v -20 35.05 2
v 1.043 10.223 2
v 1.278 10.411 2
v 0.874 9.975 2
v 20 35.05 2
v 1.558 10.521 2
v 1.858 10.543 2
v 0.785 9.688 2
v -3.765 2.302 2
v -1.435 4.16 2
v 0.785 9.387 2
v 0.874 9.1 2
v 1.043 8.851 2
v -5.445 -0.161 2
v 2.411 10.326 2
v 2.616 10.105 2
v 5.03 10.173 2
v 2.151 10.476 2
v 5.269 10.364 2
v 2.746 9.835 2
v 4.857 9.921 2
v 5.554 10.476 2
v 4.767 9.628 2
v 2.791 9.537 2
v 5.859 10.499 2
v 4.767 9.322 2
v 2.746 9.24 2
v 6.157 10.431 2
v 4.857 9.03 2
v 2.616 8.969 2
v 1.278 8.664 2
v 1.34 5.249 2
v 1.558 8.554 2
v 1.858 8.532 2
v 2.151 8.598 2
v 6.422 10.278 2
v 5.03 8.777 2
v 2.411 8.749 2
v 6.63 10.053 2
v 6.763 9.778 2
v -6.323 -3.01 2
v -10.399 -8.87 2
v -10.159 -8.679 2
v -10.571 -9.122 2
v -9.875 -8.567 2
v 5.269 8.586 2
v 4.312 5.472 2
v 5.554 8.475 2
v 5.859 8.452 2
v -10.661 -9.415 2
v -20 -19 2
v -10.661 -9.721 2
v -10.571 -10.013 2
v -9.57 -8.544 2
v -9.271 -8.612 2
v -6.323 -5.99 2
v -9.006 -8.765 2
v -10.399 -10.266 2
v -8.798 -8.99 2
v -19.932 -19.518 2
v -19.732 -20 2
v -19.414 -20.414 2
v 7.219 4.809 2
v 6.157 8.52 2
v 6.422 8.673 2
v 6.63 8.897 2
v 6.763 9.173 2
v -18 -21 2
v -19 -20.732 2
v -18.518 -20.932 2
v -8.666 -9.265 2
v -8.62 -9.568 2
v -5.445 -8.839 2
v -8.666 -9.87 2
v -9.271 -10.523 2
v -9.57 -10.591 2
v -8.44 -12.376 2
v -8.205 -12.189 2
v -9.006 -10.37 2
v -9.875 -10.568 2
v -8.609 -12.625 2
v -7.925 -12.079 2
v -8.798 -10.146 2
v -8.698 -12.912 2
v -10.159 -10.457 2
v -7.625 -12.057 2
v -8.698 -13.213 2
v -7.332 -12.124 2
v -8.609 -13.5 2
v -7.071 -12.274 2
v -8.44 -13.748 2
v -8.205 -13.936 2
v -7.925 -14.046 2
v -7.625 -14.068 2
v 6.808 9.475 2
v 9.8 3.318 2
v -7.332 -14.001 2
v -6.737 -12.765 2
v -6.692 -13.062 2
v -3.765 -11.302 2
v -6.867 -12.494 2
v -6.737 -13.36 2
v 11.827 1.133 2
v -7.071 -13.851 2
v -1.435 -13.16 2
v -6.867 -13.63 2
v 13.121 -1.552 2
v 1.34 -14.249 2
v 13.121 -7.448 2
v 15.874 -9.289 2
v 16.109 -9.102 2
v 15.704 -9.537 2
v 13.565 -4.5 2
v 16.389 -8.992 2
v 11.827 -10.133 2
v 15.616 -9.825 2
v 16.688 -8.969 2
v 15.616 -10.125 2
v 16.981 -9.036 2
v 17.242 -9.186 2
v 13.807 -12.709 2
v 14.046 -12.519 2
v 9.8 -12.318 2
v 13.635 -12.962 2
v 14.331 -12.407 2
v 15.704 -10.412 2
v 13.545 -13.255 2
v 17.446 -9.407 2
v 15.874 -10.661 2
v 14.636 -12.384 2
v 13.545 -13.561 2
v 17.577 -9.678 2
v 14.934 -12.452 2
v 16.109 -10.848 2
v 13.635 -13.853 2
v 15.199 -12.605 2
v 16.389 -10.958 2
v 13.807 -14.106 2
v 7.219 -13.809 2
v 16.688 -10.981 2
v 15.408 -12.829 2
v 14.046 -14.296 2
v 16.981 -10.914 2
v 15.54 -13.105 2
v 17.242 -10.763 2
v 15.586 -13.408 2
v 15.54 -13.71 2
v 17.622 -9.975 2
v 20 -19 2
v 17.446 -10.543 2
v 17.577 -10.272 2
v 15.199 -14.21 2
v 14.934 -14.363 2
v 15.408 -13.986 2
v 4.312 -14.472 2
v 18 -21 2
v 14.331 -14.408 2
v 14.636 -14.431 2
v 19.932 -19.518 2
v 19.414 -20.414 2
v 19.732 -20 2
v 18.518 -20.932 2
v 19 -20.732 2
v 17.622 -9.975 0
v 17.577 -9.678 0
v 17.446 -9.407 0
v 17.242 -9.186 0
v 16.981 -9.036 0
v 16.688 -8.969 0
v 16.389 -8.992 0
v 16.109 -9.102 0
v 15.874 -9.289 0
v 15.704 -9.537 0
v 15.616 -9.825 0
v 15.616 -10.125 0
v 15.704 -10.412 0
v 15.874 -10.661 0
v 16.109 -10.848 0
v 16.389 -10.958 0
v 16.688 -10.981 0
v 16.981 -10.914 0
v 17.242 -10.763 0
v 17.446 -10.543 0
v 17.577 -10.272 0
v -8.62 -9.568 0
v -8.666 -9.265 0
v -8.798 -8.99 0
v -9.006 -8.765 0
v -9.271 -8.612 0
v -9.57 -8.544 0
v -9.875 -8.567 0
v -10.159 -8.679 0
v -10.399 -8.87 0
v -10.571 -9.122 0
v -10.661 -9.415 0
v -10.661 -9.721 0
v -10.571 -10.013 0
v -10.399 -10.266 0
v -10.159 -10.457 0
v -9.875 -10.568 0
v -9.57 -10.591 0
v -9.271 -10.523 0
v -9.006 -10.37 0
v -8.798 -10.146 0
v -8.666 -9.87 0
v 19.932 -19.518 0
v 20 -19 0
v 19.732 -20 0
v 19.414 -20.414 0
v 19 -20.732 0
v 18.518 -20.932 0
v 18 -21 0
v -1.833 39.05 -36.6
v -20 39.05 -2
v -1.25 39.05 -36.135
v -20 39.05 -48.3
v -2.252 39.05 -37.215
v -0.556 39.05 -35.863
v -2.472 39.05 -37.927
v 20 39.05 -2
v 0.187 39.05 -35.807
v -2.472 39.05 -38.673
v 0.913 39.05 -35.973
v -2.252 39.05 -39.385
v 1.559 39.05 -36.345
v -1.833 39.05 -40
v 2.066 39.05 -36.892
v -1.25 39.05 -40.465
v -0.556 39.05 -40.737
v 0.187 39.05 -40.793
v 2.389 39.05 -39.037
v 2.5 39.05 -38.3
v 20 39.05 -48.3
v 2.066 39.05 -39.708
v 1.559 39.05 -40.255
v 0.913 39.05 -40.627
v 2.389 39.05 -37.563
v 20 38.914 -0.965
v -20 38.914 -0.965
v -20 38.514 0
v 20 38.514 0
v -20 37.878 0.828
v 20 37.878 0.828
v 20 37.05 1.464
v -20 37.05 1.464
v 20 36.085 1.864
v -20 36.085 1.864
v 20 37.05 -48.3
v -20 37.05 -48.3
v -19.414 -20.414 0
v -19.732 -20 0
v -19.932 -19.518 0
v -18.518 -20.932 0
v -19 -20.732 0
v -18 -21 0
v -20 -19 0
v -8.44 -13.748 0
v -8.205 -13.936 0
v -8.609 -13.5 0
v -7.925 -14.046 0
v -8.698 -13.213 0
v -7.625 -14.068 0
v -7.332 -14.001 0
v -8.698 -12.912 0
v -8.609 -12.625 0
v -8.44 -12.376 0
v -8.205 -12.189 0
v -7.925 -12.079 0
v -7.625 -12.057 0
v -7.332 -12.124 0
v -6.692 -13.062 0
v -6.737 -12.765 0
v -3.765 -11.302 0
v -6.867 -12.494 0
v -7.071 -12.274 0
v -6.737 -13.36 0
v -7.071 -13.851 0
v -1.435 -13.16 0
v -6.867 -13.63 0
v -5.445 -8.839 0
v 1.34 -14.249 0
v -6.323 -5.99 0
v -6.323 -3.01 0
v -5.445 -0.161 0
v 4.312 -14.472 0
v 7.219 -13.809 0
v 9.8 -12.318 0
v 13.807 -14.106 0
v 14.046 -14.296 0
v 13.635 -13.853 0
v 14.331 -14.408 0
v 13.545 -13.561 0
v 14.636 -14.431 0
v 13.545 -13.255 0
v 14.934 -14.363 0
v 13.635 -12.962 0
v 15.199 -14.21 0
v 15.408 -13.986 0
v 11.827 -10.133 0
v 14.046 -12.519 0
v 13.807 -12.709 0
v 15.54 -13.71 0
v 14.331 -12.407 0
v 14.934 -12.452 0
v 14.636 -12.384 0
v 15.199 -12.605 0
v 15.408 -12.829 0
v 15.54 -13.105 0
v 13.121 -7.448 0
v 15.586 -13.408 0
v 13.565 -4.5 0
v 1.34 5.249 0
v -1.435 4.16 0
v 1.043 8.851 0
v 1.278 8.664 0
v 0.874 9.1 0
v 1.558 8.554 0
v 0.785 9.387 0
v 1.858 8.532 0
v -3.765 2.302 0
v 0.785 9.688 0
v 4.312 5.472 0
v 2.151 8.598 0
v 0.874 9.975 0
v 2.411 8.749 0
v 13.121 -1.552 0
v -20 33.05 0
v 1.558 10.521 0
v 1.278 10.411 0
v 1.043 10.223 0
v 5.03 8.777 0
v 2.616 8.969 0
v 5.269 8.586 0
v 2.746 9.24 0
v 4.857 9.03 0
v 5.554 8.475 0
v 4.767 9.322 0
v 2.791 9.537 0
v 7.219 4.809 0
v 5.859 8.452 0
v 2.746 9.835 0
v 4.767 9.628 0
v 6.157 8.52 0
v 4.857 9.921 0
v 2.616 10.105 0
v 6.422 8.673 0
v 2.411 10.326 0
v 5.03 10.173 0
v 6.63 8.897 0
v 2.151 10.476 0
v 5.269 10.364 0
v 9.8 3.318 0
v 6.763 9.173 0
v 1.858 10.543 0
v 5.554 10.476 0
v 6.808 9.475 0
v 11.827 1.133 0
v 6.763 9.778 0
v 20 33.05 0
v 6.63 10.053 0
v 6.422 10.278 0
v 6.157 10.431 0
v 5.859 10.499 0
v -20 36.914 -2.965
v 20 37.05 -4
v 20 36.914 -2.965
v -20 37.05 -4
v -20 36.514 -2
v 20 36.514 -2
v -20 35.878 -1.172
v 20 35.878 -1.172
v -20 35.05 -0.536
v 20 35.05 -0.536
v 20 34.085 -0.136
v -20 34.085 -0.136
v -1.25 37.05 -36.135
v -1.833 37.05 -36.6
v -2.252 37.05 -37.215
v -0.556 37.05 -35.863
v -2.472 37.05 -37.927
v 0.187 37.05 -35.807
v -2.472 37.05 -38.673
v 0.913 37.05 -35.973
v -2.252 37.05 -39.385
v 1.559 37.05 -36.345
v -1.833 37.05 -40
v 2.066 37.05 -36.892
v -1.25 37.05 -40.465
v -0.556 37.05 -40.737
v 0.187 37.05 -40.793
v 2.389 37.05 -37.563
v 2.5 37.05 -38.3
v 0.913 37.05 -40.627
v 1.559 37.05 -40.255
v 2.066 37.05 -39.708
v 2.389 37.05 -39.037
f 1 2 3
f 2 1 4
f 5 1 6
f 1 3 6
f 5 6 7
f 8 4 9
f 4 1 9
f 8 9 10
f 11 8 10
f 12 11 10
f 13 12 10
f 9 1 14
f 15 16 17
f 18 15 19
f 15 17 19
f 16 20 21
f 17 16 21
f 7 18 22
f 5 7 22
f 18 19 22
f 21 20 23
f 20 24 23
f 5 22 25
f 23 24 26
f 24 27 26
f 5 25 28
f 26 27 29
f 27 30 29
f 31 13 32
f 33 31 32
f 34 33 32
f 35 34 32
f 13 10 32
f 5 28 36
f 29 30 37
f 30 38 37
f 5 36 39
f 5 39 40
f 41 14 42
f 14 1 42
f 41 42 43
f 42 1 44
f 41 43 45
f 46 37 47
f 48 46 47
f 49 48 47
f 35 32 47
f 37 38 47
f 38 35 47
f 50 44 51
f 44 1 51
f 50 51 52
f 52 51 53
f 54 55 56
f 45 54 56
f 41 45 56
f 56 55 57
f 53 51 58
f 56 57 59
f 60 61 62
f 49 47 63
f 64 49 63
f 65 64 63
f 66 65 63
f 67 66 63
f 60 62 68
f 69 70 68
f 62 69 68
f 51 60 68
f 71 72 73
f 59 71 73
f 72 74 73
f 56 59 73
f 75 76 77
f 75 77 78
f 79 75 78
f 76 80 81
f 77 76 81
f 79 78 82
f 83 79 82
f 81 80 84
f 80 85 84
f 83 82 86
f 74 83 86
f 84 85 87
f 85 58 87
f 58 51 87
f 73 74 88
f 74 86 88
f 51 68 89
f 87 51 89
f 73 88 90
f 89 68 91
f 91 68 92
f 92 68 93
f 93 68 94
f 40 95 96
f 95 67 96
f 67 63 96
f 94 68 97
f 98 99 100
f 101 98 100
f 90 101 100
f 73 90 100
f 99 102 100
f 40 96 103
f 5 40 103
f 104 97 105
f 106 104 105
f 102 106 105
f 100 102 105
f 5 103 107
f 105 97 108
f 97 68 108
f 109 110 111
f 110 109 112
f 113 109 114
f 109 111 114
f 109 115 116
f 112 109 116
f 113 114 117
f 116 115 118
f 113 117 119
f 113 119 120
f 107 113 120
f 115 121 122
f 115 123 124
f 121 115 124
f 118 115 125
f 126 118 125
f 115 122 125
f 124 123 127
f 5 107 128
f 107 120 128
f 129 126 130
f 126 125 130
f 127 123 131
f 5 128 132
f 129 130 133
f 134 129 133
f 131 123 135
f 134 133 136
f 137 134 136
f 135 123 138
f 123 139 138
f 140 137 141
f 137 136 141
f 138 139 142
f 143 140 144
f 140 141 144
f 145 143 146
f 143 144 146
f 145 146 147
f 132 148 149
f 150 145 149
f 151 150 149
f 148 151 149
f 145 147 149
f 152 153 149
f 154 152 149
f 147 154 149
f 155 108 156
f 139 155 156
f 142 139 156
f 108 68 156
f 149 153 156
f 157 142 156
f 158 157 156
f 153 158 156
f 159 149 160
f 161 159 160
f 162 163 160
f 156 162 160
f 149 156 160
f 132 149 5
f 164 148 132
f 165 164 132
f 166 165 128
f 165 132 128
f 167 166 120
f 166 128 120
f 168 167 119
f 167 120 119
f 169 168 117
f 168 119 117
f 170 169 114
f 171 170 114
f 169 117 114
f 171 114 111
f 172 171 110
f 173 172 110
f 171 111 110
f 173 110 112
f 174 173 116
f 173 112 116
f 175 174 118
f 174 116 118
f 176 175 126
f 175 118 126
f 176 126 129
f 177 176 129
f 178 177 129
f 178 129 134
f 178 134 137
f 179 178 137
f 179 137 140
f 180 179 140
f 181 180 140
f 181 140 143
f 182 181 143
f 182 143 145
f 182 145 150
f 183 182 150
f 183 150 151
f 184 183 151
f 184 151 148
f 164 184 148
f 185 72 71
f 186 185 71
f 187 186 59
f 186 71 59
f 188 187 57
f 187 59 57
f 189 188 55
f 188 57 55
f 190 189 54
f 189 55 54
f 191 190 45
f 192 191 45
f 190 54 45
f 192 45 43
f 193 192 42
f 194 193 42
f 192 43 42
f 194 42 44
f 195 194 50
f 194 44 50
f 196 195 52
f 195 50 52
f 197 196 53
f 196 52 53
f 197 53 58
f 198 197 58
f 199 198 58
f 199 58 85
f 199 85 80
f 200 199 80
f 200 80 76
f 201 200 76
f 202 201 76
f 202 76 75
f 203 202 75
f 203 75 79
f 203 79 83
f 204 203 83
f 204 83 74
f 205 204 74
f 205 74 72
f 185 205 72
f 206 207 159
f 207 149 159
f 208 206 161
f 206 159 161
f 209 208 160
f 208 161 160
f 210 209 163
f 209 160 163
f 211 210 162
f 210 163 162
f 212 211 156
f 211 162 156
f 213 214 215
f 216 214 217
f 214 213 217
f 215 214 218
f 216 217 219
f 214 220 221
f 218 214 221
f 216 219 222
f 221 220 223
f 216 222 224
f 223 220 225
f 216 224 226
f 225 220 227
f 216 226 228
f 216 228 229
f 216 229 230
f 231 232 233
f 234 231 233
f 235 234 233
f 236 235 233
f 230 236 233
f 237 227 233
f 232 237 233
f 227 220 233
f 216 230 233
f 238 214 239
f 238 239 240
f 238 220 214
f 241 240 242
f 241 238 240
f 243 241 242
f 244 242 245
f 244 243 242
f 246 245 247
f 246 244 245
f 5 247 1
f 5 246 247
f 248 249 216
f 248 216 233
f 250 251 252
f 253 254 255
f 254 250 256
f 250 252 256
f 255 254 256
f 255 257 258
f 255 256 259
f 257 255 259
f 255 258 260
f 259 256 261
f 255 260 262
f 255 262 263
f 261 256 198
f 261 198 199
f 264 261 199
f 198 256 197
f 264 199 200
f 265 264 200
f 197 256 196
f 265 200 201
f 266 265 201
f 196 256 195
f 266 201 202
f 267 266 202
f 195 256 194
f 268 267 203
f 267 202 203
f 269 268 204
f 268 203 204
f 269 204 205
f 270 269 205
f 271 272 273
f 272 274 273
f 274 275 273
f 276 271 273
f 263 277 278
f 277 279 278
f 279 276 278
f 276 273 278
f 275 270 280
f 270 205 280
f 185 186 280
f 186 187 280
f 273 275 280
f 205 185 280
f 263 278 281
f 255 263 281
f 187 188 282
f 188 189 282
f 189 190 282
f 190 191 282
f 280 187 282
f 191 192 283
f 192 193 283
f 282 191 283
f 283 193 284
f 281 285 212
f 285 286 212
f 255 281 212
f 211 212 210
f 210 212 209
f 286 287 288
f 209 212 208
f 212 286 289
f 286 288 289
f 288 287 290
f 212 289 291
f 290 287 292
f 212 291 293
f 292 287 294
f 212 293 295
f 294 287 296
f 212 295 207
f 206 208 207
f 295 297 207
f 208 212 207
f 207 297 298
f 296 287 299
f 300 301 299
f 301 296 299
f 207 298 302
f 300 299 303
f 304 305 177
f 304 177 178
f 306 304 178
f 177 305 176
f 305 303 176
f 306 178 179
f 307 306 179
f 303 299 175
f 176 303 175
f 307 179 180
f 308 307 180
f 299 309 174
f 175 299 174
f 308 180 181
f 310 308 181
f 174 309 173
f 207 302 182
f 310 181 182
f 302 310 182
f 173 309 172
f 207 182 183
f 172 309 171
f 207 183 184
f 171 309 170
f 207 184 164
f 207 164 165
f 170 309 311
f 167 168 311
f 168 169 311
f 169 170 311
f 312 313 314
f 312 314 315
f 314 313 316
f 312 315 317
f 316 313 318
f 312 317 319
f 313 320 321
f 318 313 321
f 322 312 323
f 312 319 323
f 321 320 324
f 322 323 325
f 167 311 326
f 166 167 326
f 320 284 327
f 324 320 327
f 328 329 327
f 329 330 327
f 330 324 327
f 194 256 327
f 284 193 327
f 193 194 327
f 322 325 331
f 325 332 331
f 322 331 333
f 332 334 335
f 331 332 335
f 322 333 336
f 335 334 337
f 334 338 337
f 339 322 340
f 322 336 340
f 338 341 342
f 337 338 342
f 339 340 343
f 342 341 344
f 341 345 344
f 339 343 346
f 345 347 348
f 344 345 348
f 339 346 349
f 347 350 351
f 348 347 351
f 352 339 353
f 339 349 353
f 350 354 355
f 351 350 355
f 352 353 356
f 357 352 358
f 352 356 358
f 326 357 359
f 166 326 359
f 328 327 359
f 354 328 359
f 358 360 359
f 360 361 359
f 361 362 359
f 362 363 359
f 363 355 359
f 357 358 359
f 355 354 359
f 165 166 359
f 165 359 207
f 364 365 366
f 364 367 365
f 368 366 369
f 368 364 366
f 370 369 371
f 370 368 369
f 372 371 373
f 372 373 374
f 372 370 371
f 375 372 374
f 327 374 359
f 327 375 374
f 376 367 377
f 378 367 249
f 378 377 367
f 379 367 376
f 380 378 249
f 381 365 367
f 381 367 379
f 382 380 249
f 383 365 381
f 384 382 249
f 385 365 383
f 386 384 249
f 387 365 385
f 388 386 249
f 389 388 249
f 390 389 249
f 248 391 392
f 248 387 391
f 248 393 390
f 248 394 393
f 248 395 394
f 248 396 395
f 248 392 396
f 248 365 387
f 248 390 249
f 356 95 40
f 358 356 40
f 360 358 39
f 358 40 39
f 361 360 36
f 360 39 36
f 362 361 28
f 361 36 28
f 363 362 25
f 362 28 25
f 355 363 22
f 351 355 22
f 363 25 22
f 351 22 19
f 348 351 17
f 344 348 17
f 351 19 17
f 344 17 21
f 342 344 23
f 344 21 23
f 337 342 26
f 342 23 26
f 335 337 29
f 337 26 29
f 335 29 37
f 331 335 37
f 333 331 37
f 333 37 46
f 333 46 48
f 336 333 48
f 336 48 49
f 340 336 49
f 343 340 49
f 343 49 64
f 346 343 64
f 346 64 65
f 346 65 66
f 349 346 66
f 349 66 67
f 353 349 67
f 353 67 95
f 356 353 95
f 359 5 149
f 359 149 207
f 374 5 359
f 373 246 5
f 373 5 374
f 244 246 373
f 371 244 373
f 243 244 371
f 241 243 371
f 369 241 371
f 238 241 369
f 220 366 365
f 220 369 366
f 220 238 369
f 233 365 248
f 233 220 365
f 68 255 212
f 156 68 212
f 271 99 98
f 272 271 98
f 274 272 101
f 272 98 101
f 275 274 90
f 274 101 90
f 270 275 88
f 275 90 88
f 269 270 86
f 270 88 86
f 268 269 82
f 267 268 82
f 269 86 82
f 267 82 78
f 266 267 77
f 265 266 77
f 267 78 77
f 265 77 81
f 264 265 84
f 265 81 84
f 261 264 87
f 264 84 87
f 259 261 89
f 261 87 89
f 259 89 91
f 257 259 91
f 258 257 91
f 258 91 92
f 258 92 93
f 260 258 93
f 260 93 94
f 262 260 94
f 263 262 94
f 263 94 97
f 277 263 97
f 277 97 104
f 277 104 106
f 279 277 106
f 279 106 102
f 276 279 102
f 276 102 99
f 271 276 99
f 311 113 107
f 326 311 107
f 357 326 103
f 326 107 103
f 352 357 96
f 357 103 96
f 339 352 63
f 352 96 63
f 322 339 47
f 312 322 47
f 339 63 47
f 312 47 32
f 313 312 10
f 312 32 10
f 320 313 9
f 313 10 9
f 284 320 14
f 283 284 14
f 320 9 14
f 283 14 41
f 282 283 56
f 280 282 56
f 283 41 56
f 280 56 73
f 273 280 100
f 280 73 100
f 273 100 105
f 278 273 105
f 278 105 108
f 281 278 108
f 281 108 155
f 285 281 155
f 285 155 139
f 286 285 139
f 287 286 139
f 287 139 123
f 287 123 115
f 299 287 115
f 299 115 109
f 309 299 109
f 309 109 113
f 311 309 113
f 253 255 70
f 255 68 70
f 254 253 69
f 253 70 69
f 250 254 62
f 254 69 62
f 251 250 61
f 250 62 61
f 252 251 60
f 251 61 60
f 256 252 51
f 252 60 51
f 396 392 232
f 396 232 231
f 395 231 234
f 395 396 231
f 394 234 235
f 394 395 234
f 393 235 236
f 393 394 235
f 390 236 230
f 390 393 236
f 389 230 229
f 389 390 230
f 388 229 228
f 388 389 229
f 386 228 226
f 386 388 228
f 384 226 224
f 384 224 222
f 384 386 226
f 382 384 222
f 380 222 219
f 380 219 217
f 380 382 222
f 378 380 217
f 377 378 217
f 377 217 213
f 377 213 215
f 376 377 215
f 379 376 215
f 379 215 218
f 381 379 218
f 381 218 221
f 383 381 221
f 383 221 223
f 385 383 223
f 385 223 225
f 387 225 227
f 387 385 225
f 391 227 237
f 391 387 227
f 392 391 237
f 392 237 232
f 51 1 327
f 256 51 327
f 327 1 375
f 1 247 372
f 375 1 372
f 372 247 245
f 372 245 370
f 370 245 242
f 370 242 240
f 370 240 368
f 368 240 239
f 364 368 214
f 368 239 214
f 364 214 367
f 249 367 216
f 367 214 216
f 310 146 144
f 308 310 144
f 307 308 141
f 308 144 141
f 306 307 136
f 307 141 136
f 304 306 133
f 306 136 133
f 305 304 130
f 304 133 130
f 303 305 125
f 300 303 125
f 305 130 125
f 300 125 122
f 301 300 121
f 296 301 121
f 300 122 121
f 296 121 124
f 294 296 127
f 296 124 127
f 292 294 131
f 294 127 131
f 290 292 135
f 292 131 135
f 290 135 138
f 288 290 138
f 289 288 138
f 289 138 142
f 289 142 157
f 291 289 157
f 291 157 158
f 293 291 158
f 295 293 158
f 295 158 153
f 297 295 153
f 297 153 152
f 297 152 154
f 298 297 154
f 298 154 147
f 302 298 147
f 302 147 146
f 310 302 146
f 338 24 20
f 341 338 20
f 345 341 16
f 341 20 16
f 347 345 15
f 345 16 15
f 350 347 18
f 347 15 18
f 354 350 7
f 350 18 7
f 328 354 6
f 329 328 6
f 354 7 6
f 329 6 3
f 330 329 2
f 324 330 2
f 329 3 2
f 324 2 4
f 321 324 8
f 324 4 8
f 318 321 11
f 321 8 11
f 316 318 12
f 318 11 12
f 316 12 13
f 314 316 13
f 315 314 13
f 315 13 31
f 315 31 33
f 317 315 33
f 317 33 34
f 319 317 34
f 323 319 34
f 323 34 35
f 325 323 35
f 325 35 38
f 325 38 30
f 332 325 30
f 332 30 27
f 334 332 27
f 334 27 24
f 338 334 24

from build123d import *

# Parameters (mm, degrees)
SKETCH1_W           = 40
SKETCH1_H           = 42
BOSS_EXTRUDE1_DEPTH = 2
SKETCH3_W           = 40
SKETCH3_H           = 2
BOSS_EXTRUDE2_DEPTH = 48.3
FILLET1_R           = 2
FILLET2_R           = 2
CUT_EXTRUDE5_REACH  = 52.3
SKETCH7_R           = 1.008522139
SKETCH7_R_2         = 1.026344308
SKETCH7_R_3         = 1.008522138
SKETCH7_R_4         = 10
CUT_EXTRUDE6_REACH  = 4
SKETCH4_R           = 2.5
SKETCH8_W           = 40
SKETCH8_H           = 50.3
SKETCH8_R           = 2.5
BOSS_EXTRUDE3_DEPTH = 18.05
SKETCH10_W          = 40
SKETCH10_H          = 6.748630519
BOSS_EXTRUDE5_DEPTH = 17.05
SKETCH11_W          = 40
SKETCH11_H          = 46.3
CUT_EXTRUDE7_DEPTH  = 18.05
SKETCH12_W          = 40
SKETCH12_H          = 2
CUT_EXTRUDE8_DEPTH  = 22.05
SKETCH13_W          = 2
SKETCH13_H          = 2
BOSS_EXTRUDE6_DEPTH = 40
FILLET3_R           = 4
FILLET4_R           = 4


with BuildPart() as part:
    # Sketch1 → Boss-Extrude1 (new body)
    with BuildSketch(Plane.XY):
        Rectangle(SKETCH1_W, SKETCH1_H)
    extrude(amount=BOSS_EXTRUDE1_DEPTH)

    # Sketch3 → Boss-Extrude2 (add)
    with BuildSketch(Plane(origin=(0, 0, 0), x_dir=(-1, 0, 0), z_dir=(0, 0, -1))):
        with Locations((0, 20)):
            Rectangle(SKETCH3_W, SKETCH3_H)
    extrude(amount=BOSS_EXTRUDE2_DEPTH)

    # Fillet1
    fillet1_edges = [part.edges().sort_by_distance(p)[0] for p in [
        (0, 19, 0),
        (0, 21, 2),
    ]]
    fillet(fillet1_edges, radius=FILLET1_R)

    # Fillet2
    fillet2_edges = [part.edges().sort_by_distance(p)[0] for p in [
        (20, -21, 1),
        (-20, -21, 1),
    ]]
    fillet(fillet2_edges, radius=FILLET2_R)

    # Sketch7 → Cut-Extrude5 (cut, up to next)
    with BuildSketch(Plane.XY.offset(2), mode=Mode.PRIVATE) as cut_extrude5_sk1:
        with Locations((-7.700271416, -13.062366093)):
            Circle(SKETCH7_R)
    cut_extrude5_tool1 = extrude(cut_extrude5_sk1.sketch, amount=-CUT_EXTRUDE5_REACH, mode=Mode.PRIVATE) & part.part
    add(cut_extrude5_tool1.solids().sort_by_distance((-7.700271, -13.062366, 2))[0], mode=Mode.SUBTRACT)
    # Sketch7 → Cut-Extrude5 (cut, up to next)
    with BuildSketch(Plane.XY.offset(2), mode=Mode.PRIVATE) as cut_extrude5_sk2:
        with Locations((-9.646314877, -9.567667988)):
            Circle(SKETCH7_R_2)
    cut_extrude5_tool2 = extrude(cut_extrude5_sk2.sketch, amount=-CUT_EXTRUDE5_REACH, mode=Mode.PRIVATE) & part.part
    add(cut_extrude5_tool2.solids().sort_by_distance((-9.646315, -9.567668, 2))[0], mode=Mode.SUBTRACT)
    # Sketch7 → Cut-Extrude5 (cut, up to next)
    with BuildSketch(Plane.XY.offset(2), mode=Mode.PRIVATE) as cut_extrude5_sk3:
        with Locations((1.782545423, 9.537272948)):
            Circle(SKETCH7_R_3)
    cut_extrude5_tool3 = extrude(cut_extrude5_sk3.sketch, amount=-CUT_EXTRUDE5_REACH, mode=Mode.PRIVATE) & part.part
    add(cut_extrude5_tool3.solids().sort_by_distance((1.782545, 9.537273, 2))[0], mode=Mode.SUBTRACT)
    # Sketch7 → Cut-Extrude5 (cut, up to next)
    with BuildSketch(Plane.XY.offset(2), mode=Mode.PRIVATE) as cut_extrude5_sk4:
        with Locations((5.782064491, 9.475246969)):
            Circle(SKETCH7_R_2)
    cut_extrude5_tool4 = extrude(cut_extrude5_sk4.sketch, amount=-CUT_EXTRUDE5_REACH, mode=Mode.PRIVATE) & part.part
    add(cut_extrude5_tool4.solids().sort_by_distance((5.782064, 9.475247, 2))[0], mode=Mode.SUBTRACT)
    # Sketch7 → Cut-Extrude5 (cut, up to next)
    with BuildSketch(Plane.XY.offset(2), mode=Mode.PRIVATE) as cut_extrude5_sk5:
        with Locations((3.565090845, -4.5)):
            Circle(SKETCH7_R_4)
    cut_extrude5_tool5 = extrude(cut_extrude5_sk5.sketch, amount=-CUT_EXTRUDE5_REACH, mode=Mode.PRIVATE) & part.part
    add(cut_extrude5_tool5.solids().sort_by_distance((3.565091, -4.5, 2))[0], mode=Mode.SUBTRACT)
    # Sketch7 → Cut-Extrude5 (cut, up to next)
    with BuildSketch(Plane.XY.offset(2), mode=Mode.PRIVATE) as cut_extrude5_sk6:
        with Locations((16.612998529, -9.974906855)):
            Circle(SKETCH7_R)
    cut_extrude5_tool6 = extrude(cut_extrude5_sk6.sketch, amount=-CUT_EXTRUDE5_REACH, mode=Mode.PRIVATE) & part.part
    add(cut_extrude5_tool6.solids().sort_by_distance((16.612999, -9.974907, 2))[0], mode=Mode.SUBTRACT)
    # Sketch7 → Cut-Extrude5 (cut, up to next)
    with BuildSketch(Plane.XY.offset(2), mode=Mode.PRIVATE) as cut_extrude5_sk7:
        with Locations((14.559522922, -13.407578981)):
            Circle(SKETCH7_R_2)
    cut_extrude5_tool7 = extrude(cut_extrude5_sk7.sketch, amount=-CUT_EXTRUDE5_REACH, mode=Mode.PRIVATE) & part.part
    add(cut_extrude5_tool7.solids().sort_by_distance((14.559523, -13.407579, 2))[0], mode=Mode.SUBTRACT)

    # Sketch4 → Cut-Extrude6 (cut, up to next)
    with BuildSketch(Plane.XZ.offset(-19), mode=Mode.PRIVATE) as cut_extrude6_sk1:
        with Locations((0, -38.3)):
            Circle(SKETCH4_R)
    cut_extrude6_tool1 = extrude(cut_extrude6_sk1.sketch, amount=-CUT_EXTRUDE6_REACH, mode=Mode.PRIVATE) & part.part
    add(cut_extrude6_tool1.solids().sort_by_distance((0, 19, -38.3))[0], mode=Mode.SUBTRACT)

    # Sketch8 → Boss-Extrude3 (add)
    with BuildSketch(Plane(origin=(0, 21, 0), x_dir=(1, 0, 0), z_dir=(0, 1, 0))):
        with Locations((0, 23.15)):
            Rectangle(SKETCH8_W, SKETCH8_H)
        with Locations((0, 38.3)):
            Circle(SKETCH8_R, mode=Mode.SUBTRACT)
    extrude(amount=BOSS_EXTRUDE3_DEPTH)

    # Sketch10 → Boss-Extrude5 (add)
    with BuildSketch(Plane.XY.offset(2)):
        with Locations((0, 22.37431526)):
            Rectangle(SKETCH10_W, SKETCH10_H)
    extrude(amount=-BOSS_EXTRUDE5_DEPTH)

    # Sketch11 → Cut-Extrude7 (cut)
    with BuildSketch(Plane.XZ.offset(-19)):
        with Locations((0, -25.15)):
            Rectangle(SKETCH11_W, SKETCH11_H)
    extrude(amount=-CUT_EXTRUDE7_DEPTH, mode=Mode.SUBTRACT)

    # Sketch12 → Cut-Extrude8 (cut)
    with BuildSketch(Plane(origin=(0, 39.05, 0), x_dir=(1, 0, 0), z_dir=(0, 1, 0))):
        with Locations((0, 1)):
            Rectangle(SKETCH12_W, SKETCH12_H)
    extrude(amount=-CUT_EXTRUDE8_DEPTH, mode=Mode.SUBTRACT)

    # Sketch13 → Boss-Extrude6 (add)
    with BuildSketch(Plane(origin=(20, 0, 0), x_dir=(0, 0, -1), z_dir=(1, 0, 0))):
        with Locations((1, 38.05)):
            Rectangle(SKETCH13_W, SKETCH13_H)
    extrude(amount=-BOSS_EXTRUDE6_DEPTH)

    # Fillet3
    fillet3_edges = [part.edges().sort_by_distance(p)[0] for p in [
        (0, 39.05, 2),
    ]]
    fillet(fillet3_edges, radius=FILLET3_R)

    # Fillet4
    fillet4_edges = [part.edges().sort_by_distance(p)[0] for p in [
        (0, 37.05, 0),
    ]]
    fillet(fillet4_edges, radius=FILLET4_R)


solid = part.part
